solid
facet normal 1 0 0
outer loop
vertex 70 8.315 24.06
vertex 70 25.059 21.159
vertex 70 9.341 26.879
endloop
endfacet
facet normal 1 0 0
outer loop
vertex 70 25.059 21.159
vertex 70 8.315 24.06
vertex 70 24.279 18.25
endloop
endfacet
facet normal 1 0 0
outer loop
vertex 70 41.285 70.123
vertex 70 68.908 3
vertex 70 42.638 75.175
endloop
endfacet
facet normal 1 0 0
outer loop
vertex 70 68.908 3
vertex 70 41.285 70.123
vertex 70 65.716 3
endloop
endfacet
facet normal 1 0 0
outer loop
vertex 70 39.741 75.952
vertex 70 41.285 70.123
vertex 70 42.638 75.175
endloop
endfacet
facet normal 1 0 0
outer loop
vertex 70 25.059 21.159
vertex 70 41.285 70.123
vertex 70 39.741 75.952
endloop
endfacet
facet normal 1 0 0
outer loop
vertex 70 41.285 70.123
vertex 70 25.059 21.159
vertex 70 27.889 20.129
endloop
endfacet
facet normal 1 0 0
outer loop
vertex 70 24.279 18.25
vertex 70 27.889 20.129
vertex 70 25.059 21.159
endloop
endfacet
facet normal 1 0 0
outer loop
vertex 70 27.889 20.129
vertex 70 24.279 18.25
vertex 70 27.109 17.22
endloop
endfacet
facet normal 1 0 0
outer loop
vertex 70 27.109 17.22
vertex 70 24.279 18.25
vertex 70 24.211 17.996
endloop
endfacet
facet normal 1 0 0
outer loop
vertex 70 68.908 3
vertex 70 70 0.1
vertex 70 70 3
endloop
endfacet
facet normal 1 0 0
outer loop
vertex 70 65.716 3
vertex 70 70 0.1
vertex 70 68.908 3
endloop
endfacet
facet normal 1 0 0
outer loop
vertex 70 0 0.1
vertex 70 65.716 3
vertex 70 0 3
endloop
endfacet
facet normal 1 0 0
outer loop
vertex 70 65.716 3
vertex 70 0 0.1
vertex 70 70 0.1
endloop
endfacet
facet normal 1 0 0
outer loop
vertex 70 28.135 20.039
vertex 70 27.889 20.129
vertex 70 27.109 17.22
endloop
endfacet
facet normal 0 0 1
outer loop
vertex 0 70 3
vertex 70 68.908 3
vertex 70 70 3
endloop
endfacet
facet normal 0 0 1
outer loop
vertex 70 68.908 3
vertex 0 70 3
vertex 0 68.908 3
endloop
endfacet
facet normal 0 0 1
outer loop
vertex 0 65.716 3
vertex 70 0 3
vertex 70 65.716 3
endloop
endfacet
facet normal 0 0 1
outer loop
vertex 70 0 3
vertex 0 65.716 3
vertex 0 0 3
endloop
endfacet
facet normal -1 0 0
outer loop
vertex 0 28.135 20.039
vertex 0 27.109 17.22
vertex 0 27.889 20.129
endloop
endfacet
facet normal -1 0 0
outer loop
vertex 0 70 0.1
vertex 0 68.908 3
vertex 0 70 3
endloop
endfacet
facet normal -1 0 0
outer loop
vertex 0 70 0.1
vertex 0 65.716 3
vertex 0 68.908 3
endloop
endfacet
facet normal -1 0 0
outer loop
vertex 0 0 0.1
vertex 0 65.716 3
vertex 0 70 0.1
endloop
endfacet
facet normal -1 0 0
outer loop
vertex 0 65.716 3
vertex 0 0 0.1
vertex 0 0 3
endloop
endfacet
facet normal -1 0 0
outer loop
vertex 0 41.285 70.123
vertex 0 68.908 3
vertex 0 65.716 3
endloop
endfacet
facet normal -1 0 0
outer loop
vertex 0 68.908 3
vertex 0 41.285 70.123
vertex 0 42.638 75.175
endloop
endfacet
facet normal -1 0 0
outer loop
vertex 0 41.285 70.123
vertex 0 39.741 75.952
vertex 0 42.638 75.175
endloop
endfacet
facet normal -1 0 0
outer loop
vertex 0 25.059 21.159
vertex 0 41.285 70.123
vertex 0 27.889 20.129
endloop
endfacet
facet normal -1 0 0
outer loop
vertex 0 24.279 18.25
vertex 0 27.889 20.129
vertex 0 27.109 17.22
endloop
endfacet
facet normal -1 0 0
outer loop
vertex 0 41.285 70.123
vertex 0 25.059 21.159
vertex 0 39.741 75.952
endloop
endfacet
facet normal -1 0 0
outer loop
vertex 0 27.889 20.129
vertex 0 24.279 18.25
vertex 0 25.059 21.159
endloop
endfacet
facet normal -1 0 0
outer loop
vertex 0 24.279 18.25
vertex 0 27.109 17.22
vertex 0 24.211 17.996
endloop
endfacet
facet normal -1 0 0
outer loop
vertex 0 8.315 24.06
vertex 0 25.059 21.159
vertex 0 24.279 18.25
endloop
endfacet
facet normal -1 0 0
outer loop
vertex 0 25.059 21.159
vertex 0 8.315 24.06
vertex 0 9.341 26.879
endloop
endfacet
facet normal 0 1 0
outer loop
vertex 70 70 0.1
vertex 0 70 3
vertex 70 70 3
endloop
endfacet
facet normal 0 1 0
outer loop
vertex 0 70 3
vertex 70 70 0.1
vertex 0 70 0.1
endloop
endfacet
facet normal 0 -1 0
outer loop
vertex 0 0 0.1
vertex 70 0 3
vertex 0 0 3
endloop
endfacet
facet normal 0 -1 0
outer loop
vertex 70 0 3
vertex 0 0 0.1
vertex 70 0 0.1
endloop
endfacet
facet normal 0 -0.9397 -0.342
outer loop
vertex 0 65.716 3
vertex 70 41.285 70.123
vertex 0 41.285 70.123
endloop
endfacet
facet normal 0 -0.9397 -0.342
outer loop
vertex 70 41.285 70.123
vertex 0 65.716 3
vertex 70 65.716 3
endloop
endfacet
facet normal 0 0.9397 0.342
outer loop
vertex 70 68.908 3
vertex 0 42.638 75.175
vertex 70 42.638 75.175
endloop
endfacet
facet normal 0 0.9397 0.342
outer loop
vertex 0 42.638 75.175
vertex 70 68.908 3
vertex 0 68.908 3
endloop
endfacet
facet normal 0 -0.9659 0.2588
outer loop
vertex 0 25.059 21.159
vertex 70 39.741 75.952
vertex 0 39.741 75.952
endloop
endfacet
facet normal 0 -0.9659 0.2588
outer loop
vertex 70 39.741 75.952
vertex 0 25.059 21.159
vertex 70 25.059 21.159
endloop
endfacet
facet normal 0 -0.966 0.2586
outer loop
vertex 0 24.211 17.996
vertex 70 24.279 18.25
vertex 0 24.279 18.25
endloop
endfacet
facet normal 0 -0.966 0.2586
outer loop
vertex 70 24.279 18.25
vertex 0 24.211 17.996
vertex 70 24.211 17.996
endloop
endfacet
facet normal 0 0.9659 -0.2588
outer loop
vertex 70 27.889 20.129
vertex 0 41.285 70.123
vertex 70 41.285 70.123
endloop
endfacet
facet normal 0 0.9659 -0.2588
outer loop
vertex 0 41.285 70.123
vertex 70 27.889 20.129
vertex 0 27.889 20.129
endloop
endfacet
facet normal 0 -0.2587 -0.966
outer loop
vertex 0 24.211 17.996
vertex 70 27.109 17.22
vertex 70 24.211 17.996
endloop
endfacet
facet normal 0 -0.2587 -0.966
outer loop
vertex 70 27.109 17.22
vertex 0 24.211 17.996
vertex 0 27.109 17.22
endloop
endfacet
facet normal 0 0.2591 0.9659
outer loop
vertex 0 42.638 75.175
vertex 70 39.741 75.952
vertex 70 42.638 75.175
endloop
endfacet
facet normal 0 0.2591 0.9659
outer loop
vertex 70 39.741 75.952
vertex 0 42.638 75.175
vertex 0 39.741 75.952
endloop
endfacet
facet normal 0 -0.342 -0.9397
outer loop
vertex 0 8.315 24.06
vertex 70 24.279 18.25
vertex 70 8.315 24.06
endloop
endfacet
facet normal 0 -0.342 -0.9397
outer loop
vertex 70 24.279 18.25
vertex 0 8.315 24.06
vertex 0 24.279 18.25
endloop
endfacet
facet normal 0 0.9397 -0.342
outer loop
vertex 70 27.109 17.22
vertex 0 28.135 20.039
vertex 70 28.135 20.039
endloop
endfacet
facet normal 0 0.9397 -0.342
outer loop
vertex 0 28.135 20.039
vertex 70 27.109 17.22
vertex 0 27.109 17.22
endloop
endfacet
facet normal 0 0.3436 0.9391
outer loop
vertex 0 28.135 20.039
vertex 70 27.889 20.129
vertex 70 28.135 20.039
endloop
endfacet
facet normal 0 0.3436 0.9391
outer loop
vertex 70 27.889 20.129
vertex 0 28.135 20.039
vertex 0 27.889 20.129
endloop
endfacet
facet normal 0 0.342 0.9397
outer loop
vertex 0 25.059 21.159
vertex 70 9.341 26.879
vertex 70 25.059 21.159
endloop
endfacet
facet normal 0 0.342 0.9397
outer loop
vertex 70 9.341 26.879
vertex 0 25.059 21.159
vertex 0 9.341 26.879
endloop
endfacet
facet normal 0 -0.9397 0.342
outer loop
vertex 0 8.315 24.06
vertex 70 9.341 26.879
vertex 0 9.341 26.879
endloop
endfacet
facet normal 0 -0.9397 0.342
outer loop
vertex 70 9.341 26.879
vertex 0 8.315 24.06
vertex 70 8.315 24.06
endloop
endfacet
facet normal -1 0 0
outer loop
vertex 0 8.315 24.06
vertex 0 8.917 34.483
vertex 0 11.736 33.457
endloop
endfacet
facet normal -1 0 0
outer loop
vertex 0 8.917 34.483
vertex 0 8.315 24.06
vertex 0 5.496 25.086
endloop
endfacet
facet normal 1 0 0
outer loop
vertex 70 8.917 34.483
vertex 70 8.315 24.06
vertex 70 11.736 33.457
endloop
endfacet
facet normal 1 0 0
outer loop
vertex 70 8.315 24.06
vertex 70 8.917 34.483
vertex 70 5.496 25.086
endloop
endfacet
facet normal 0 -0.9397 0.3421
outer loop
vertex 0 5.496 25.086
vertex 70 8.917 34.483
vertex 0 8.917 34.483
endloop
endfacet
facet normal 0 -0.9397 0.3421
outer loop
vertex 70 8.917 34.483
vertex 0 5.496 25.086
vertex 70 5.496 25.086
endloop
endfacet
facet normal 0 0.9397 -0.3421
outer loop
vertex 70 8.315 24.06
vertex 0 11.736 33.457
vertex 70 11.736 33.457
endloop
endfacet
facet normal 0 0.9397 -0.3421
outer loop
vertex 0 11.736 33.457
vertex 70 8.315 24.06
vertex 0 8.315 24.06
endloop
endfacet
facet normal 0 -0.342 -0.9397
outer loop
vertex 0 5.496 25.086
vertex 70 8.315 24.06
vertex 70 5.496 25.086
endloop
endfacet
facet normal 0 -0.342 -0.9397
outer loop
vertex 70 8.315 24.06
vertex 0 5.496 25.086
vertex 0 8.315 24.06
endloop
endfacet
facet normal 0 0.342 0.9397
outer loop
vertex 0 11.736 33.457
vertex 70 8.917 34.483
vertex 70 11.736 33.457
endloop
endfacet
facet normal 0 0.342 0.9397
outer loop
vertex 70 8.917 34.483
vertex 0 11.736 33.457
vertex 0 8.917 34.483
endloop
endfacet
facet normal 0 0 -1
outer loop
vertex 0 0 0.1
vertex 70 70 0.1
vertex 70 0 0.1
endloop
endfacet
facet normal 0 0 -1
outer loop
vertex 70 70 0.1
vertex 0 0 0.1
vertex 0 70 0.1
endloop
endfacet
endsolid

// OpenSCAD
//preview[view:south west, tilt:top diagonal]
//original
//base_width1 = 70
//base_width2 = 60
//base_length = 86
//base_height = 2

//bottom
base_width = 70; //[10:100]
base_length = 70; //[50:120]
wall_thickness= 3; //[1:7]
//back
sa_height = 80; //[60:150]
sa_angle = 110; //[90:125] 
//front
sv_height = 60; //[20:80]
sv_angle = 75; //[20:90]
//tray bottom
to_length = 20; //[10:30]
to_angle = 340; //[330:360]
//tray front
tv_length = 10; //[5:25]
//IMPORTANT set this when exporting to STL (to print on its side !! supportless)
print_mode = "preview"; //[preview,print]
fuzz = 0.1; //prevents rendering glitches

start();

module start(){
	if (print_mode == "preview"){
		stand();
	} else {
		rotate(-90,[0,1,0])
		stand();
	}
}

module stand(){
	difference(){
 		ding();
		//maak onderkant plat
		translate([-300,-300,-600 + fuzz]) cube([600,600,600]);
	}
}

module ding(){
	//onderkant
	cube([base_width,base_length,wall_thickness]);
	//schuine achterkant
	 translate([0,base_length,0]) 
	rotate(sa_angle,[1,0,0]) 
	cube([base_width,sa_height,wall_thickness]);
	//schuine voorkant
	translate([0,base_length+cos(sa_angle)*sa_height,sin(sa_angle)*sa_height]) 
	rotate(sv_angle,[1,0,0]) 
	translate([0,-sv_height,0]) 
	cube([base_width,sv_height,wall_thickness]);
	//tray onderkant
	translate([0,-cos(sv_angle)*sv_height,-sin(sv_angle)*sv_height])
	translate([0,base_length+cos(sa_angle)*sa_height,sin(sa_angle)*sa_height])
	rotate(to_angle,[1,0,0])
	translate([0,-to_length,0])
	cube([base_width,to_length,wall_thickness]);
	//tray_voorkant
	translate([0,-cos(to_angle)*to_length,,-sin(to_angle)*to_length])
	translate([0,-cos(sv_angle)*sv_height,-sin(sv_angle)*sv_height])
	translate([0,base_length+cos(sa_angle)*sa_height,sin(sa_angle)*sa_height])
	rotate(to_angle+90,[1,0,0])
	cube([base_width,tv_length,wall_thickness]);
}

module oud(){
//base
cube([base_width,base_length,base_height]);

back_length = 110;
back_thickness = 3;
back_angle = 23;

//back
translate([0,base_length,0])
rotate(back_angle,[1,0,0])
cube([base_width,back_thickness,back_length]);

front_length = 62;
front_thickness = 3;
front_transY = sin(back_angle) * back_length;
front_transZ = cos(back_angle) * back_length;
front_angle = 240;

//front
translate([0,front_transY, front_transZ])
rotate(front_angle, [1,0,0])
cube([base_width,front_length,front_thickness]);

h_length = 22;

//houder
translate([0,16,49]) //-7, 46?
rotate(150,[1,0,0])
cube([base_width,h_length,base_height]);

s_length  = 10;

//stuff
translate([0,-2,56]) //-7, 46?
rotate(60,[1,0,0])
cube([base_width,s_length,base_height]);
}
